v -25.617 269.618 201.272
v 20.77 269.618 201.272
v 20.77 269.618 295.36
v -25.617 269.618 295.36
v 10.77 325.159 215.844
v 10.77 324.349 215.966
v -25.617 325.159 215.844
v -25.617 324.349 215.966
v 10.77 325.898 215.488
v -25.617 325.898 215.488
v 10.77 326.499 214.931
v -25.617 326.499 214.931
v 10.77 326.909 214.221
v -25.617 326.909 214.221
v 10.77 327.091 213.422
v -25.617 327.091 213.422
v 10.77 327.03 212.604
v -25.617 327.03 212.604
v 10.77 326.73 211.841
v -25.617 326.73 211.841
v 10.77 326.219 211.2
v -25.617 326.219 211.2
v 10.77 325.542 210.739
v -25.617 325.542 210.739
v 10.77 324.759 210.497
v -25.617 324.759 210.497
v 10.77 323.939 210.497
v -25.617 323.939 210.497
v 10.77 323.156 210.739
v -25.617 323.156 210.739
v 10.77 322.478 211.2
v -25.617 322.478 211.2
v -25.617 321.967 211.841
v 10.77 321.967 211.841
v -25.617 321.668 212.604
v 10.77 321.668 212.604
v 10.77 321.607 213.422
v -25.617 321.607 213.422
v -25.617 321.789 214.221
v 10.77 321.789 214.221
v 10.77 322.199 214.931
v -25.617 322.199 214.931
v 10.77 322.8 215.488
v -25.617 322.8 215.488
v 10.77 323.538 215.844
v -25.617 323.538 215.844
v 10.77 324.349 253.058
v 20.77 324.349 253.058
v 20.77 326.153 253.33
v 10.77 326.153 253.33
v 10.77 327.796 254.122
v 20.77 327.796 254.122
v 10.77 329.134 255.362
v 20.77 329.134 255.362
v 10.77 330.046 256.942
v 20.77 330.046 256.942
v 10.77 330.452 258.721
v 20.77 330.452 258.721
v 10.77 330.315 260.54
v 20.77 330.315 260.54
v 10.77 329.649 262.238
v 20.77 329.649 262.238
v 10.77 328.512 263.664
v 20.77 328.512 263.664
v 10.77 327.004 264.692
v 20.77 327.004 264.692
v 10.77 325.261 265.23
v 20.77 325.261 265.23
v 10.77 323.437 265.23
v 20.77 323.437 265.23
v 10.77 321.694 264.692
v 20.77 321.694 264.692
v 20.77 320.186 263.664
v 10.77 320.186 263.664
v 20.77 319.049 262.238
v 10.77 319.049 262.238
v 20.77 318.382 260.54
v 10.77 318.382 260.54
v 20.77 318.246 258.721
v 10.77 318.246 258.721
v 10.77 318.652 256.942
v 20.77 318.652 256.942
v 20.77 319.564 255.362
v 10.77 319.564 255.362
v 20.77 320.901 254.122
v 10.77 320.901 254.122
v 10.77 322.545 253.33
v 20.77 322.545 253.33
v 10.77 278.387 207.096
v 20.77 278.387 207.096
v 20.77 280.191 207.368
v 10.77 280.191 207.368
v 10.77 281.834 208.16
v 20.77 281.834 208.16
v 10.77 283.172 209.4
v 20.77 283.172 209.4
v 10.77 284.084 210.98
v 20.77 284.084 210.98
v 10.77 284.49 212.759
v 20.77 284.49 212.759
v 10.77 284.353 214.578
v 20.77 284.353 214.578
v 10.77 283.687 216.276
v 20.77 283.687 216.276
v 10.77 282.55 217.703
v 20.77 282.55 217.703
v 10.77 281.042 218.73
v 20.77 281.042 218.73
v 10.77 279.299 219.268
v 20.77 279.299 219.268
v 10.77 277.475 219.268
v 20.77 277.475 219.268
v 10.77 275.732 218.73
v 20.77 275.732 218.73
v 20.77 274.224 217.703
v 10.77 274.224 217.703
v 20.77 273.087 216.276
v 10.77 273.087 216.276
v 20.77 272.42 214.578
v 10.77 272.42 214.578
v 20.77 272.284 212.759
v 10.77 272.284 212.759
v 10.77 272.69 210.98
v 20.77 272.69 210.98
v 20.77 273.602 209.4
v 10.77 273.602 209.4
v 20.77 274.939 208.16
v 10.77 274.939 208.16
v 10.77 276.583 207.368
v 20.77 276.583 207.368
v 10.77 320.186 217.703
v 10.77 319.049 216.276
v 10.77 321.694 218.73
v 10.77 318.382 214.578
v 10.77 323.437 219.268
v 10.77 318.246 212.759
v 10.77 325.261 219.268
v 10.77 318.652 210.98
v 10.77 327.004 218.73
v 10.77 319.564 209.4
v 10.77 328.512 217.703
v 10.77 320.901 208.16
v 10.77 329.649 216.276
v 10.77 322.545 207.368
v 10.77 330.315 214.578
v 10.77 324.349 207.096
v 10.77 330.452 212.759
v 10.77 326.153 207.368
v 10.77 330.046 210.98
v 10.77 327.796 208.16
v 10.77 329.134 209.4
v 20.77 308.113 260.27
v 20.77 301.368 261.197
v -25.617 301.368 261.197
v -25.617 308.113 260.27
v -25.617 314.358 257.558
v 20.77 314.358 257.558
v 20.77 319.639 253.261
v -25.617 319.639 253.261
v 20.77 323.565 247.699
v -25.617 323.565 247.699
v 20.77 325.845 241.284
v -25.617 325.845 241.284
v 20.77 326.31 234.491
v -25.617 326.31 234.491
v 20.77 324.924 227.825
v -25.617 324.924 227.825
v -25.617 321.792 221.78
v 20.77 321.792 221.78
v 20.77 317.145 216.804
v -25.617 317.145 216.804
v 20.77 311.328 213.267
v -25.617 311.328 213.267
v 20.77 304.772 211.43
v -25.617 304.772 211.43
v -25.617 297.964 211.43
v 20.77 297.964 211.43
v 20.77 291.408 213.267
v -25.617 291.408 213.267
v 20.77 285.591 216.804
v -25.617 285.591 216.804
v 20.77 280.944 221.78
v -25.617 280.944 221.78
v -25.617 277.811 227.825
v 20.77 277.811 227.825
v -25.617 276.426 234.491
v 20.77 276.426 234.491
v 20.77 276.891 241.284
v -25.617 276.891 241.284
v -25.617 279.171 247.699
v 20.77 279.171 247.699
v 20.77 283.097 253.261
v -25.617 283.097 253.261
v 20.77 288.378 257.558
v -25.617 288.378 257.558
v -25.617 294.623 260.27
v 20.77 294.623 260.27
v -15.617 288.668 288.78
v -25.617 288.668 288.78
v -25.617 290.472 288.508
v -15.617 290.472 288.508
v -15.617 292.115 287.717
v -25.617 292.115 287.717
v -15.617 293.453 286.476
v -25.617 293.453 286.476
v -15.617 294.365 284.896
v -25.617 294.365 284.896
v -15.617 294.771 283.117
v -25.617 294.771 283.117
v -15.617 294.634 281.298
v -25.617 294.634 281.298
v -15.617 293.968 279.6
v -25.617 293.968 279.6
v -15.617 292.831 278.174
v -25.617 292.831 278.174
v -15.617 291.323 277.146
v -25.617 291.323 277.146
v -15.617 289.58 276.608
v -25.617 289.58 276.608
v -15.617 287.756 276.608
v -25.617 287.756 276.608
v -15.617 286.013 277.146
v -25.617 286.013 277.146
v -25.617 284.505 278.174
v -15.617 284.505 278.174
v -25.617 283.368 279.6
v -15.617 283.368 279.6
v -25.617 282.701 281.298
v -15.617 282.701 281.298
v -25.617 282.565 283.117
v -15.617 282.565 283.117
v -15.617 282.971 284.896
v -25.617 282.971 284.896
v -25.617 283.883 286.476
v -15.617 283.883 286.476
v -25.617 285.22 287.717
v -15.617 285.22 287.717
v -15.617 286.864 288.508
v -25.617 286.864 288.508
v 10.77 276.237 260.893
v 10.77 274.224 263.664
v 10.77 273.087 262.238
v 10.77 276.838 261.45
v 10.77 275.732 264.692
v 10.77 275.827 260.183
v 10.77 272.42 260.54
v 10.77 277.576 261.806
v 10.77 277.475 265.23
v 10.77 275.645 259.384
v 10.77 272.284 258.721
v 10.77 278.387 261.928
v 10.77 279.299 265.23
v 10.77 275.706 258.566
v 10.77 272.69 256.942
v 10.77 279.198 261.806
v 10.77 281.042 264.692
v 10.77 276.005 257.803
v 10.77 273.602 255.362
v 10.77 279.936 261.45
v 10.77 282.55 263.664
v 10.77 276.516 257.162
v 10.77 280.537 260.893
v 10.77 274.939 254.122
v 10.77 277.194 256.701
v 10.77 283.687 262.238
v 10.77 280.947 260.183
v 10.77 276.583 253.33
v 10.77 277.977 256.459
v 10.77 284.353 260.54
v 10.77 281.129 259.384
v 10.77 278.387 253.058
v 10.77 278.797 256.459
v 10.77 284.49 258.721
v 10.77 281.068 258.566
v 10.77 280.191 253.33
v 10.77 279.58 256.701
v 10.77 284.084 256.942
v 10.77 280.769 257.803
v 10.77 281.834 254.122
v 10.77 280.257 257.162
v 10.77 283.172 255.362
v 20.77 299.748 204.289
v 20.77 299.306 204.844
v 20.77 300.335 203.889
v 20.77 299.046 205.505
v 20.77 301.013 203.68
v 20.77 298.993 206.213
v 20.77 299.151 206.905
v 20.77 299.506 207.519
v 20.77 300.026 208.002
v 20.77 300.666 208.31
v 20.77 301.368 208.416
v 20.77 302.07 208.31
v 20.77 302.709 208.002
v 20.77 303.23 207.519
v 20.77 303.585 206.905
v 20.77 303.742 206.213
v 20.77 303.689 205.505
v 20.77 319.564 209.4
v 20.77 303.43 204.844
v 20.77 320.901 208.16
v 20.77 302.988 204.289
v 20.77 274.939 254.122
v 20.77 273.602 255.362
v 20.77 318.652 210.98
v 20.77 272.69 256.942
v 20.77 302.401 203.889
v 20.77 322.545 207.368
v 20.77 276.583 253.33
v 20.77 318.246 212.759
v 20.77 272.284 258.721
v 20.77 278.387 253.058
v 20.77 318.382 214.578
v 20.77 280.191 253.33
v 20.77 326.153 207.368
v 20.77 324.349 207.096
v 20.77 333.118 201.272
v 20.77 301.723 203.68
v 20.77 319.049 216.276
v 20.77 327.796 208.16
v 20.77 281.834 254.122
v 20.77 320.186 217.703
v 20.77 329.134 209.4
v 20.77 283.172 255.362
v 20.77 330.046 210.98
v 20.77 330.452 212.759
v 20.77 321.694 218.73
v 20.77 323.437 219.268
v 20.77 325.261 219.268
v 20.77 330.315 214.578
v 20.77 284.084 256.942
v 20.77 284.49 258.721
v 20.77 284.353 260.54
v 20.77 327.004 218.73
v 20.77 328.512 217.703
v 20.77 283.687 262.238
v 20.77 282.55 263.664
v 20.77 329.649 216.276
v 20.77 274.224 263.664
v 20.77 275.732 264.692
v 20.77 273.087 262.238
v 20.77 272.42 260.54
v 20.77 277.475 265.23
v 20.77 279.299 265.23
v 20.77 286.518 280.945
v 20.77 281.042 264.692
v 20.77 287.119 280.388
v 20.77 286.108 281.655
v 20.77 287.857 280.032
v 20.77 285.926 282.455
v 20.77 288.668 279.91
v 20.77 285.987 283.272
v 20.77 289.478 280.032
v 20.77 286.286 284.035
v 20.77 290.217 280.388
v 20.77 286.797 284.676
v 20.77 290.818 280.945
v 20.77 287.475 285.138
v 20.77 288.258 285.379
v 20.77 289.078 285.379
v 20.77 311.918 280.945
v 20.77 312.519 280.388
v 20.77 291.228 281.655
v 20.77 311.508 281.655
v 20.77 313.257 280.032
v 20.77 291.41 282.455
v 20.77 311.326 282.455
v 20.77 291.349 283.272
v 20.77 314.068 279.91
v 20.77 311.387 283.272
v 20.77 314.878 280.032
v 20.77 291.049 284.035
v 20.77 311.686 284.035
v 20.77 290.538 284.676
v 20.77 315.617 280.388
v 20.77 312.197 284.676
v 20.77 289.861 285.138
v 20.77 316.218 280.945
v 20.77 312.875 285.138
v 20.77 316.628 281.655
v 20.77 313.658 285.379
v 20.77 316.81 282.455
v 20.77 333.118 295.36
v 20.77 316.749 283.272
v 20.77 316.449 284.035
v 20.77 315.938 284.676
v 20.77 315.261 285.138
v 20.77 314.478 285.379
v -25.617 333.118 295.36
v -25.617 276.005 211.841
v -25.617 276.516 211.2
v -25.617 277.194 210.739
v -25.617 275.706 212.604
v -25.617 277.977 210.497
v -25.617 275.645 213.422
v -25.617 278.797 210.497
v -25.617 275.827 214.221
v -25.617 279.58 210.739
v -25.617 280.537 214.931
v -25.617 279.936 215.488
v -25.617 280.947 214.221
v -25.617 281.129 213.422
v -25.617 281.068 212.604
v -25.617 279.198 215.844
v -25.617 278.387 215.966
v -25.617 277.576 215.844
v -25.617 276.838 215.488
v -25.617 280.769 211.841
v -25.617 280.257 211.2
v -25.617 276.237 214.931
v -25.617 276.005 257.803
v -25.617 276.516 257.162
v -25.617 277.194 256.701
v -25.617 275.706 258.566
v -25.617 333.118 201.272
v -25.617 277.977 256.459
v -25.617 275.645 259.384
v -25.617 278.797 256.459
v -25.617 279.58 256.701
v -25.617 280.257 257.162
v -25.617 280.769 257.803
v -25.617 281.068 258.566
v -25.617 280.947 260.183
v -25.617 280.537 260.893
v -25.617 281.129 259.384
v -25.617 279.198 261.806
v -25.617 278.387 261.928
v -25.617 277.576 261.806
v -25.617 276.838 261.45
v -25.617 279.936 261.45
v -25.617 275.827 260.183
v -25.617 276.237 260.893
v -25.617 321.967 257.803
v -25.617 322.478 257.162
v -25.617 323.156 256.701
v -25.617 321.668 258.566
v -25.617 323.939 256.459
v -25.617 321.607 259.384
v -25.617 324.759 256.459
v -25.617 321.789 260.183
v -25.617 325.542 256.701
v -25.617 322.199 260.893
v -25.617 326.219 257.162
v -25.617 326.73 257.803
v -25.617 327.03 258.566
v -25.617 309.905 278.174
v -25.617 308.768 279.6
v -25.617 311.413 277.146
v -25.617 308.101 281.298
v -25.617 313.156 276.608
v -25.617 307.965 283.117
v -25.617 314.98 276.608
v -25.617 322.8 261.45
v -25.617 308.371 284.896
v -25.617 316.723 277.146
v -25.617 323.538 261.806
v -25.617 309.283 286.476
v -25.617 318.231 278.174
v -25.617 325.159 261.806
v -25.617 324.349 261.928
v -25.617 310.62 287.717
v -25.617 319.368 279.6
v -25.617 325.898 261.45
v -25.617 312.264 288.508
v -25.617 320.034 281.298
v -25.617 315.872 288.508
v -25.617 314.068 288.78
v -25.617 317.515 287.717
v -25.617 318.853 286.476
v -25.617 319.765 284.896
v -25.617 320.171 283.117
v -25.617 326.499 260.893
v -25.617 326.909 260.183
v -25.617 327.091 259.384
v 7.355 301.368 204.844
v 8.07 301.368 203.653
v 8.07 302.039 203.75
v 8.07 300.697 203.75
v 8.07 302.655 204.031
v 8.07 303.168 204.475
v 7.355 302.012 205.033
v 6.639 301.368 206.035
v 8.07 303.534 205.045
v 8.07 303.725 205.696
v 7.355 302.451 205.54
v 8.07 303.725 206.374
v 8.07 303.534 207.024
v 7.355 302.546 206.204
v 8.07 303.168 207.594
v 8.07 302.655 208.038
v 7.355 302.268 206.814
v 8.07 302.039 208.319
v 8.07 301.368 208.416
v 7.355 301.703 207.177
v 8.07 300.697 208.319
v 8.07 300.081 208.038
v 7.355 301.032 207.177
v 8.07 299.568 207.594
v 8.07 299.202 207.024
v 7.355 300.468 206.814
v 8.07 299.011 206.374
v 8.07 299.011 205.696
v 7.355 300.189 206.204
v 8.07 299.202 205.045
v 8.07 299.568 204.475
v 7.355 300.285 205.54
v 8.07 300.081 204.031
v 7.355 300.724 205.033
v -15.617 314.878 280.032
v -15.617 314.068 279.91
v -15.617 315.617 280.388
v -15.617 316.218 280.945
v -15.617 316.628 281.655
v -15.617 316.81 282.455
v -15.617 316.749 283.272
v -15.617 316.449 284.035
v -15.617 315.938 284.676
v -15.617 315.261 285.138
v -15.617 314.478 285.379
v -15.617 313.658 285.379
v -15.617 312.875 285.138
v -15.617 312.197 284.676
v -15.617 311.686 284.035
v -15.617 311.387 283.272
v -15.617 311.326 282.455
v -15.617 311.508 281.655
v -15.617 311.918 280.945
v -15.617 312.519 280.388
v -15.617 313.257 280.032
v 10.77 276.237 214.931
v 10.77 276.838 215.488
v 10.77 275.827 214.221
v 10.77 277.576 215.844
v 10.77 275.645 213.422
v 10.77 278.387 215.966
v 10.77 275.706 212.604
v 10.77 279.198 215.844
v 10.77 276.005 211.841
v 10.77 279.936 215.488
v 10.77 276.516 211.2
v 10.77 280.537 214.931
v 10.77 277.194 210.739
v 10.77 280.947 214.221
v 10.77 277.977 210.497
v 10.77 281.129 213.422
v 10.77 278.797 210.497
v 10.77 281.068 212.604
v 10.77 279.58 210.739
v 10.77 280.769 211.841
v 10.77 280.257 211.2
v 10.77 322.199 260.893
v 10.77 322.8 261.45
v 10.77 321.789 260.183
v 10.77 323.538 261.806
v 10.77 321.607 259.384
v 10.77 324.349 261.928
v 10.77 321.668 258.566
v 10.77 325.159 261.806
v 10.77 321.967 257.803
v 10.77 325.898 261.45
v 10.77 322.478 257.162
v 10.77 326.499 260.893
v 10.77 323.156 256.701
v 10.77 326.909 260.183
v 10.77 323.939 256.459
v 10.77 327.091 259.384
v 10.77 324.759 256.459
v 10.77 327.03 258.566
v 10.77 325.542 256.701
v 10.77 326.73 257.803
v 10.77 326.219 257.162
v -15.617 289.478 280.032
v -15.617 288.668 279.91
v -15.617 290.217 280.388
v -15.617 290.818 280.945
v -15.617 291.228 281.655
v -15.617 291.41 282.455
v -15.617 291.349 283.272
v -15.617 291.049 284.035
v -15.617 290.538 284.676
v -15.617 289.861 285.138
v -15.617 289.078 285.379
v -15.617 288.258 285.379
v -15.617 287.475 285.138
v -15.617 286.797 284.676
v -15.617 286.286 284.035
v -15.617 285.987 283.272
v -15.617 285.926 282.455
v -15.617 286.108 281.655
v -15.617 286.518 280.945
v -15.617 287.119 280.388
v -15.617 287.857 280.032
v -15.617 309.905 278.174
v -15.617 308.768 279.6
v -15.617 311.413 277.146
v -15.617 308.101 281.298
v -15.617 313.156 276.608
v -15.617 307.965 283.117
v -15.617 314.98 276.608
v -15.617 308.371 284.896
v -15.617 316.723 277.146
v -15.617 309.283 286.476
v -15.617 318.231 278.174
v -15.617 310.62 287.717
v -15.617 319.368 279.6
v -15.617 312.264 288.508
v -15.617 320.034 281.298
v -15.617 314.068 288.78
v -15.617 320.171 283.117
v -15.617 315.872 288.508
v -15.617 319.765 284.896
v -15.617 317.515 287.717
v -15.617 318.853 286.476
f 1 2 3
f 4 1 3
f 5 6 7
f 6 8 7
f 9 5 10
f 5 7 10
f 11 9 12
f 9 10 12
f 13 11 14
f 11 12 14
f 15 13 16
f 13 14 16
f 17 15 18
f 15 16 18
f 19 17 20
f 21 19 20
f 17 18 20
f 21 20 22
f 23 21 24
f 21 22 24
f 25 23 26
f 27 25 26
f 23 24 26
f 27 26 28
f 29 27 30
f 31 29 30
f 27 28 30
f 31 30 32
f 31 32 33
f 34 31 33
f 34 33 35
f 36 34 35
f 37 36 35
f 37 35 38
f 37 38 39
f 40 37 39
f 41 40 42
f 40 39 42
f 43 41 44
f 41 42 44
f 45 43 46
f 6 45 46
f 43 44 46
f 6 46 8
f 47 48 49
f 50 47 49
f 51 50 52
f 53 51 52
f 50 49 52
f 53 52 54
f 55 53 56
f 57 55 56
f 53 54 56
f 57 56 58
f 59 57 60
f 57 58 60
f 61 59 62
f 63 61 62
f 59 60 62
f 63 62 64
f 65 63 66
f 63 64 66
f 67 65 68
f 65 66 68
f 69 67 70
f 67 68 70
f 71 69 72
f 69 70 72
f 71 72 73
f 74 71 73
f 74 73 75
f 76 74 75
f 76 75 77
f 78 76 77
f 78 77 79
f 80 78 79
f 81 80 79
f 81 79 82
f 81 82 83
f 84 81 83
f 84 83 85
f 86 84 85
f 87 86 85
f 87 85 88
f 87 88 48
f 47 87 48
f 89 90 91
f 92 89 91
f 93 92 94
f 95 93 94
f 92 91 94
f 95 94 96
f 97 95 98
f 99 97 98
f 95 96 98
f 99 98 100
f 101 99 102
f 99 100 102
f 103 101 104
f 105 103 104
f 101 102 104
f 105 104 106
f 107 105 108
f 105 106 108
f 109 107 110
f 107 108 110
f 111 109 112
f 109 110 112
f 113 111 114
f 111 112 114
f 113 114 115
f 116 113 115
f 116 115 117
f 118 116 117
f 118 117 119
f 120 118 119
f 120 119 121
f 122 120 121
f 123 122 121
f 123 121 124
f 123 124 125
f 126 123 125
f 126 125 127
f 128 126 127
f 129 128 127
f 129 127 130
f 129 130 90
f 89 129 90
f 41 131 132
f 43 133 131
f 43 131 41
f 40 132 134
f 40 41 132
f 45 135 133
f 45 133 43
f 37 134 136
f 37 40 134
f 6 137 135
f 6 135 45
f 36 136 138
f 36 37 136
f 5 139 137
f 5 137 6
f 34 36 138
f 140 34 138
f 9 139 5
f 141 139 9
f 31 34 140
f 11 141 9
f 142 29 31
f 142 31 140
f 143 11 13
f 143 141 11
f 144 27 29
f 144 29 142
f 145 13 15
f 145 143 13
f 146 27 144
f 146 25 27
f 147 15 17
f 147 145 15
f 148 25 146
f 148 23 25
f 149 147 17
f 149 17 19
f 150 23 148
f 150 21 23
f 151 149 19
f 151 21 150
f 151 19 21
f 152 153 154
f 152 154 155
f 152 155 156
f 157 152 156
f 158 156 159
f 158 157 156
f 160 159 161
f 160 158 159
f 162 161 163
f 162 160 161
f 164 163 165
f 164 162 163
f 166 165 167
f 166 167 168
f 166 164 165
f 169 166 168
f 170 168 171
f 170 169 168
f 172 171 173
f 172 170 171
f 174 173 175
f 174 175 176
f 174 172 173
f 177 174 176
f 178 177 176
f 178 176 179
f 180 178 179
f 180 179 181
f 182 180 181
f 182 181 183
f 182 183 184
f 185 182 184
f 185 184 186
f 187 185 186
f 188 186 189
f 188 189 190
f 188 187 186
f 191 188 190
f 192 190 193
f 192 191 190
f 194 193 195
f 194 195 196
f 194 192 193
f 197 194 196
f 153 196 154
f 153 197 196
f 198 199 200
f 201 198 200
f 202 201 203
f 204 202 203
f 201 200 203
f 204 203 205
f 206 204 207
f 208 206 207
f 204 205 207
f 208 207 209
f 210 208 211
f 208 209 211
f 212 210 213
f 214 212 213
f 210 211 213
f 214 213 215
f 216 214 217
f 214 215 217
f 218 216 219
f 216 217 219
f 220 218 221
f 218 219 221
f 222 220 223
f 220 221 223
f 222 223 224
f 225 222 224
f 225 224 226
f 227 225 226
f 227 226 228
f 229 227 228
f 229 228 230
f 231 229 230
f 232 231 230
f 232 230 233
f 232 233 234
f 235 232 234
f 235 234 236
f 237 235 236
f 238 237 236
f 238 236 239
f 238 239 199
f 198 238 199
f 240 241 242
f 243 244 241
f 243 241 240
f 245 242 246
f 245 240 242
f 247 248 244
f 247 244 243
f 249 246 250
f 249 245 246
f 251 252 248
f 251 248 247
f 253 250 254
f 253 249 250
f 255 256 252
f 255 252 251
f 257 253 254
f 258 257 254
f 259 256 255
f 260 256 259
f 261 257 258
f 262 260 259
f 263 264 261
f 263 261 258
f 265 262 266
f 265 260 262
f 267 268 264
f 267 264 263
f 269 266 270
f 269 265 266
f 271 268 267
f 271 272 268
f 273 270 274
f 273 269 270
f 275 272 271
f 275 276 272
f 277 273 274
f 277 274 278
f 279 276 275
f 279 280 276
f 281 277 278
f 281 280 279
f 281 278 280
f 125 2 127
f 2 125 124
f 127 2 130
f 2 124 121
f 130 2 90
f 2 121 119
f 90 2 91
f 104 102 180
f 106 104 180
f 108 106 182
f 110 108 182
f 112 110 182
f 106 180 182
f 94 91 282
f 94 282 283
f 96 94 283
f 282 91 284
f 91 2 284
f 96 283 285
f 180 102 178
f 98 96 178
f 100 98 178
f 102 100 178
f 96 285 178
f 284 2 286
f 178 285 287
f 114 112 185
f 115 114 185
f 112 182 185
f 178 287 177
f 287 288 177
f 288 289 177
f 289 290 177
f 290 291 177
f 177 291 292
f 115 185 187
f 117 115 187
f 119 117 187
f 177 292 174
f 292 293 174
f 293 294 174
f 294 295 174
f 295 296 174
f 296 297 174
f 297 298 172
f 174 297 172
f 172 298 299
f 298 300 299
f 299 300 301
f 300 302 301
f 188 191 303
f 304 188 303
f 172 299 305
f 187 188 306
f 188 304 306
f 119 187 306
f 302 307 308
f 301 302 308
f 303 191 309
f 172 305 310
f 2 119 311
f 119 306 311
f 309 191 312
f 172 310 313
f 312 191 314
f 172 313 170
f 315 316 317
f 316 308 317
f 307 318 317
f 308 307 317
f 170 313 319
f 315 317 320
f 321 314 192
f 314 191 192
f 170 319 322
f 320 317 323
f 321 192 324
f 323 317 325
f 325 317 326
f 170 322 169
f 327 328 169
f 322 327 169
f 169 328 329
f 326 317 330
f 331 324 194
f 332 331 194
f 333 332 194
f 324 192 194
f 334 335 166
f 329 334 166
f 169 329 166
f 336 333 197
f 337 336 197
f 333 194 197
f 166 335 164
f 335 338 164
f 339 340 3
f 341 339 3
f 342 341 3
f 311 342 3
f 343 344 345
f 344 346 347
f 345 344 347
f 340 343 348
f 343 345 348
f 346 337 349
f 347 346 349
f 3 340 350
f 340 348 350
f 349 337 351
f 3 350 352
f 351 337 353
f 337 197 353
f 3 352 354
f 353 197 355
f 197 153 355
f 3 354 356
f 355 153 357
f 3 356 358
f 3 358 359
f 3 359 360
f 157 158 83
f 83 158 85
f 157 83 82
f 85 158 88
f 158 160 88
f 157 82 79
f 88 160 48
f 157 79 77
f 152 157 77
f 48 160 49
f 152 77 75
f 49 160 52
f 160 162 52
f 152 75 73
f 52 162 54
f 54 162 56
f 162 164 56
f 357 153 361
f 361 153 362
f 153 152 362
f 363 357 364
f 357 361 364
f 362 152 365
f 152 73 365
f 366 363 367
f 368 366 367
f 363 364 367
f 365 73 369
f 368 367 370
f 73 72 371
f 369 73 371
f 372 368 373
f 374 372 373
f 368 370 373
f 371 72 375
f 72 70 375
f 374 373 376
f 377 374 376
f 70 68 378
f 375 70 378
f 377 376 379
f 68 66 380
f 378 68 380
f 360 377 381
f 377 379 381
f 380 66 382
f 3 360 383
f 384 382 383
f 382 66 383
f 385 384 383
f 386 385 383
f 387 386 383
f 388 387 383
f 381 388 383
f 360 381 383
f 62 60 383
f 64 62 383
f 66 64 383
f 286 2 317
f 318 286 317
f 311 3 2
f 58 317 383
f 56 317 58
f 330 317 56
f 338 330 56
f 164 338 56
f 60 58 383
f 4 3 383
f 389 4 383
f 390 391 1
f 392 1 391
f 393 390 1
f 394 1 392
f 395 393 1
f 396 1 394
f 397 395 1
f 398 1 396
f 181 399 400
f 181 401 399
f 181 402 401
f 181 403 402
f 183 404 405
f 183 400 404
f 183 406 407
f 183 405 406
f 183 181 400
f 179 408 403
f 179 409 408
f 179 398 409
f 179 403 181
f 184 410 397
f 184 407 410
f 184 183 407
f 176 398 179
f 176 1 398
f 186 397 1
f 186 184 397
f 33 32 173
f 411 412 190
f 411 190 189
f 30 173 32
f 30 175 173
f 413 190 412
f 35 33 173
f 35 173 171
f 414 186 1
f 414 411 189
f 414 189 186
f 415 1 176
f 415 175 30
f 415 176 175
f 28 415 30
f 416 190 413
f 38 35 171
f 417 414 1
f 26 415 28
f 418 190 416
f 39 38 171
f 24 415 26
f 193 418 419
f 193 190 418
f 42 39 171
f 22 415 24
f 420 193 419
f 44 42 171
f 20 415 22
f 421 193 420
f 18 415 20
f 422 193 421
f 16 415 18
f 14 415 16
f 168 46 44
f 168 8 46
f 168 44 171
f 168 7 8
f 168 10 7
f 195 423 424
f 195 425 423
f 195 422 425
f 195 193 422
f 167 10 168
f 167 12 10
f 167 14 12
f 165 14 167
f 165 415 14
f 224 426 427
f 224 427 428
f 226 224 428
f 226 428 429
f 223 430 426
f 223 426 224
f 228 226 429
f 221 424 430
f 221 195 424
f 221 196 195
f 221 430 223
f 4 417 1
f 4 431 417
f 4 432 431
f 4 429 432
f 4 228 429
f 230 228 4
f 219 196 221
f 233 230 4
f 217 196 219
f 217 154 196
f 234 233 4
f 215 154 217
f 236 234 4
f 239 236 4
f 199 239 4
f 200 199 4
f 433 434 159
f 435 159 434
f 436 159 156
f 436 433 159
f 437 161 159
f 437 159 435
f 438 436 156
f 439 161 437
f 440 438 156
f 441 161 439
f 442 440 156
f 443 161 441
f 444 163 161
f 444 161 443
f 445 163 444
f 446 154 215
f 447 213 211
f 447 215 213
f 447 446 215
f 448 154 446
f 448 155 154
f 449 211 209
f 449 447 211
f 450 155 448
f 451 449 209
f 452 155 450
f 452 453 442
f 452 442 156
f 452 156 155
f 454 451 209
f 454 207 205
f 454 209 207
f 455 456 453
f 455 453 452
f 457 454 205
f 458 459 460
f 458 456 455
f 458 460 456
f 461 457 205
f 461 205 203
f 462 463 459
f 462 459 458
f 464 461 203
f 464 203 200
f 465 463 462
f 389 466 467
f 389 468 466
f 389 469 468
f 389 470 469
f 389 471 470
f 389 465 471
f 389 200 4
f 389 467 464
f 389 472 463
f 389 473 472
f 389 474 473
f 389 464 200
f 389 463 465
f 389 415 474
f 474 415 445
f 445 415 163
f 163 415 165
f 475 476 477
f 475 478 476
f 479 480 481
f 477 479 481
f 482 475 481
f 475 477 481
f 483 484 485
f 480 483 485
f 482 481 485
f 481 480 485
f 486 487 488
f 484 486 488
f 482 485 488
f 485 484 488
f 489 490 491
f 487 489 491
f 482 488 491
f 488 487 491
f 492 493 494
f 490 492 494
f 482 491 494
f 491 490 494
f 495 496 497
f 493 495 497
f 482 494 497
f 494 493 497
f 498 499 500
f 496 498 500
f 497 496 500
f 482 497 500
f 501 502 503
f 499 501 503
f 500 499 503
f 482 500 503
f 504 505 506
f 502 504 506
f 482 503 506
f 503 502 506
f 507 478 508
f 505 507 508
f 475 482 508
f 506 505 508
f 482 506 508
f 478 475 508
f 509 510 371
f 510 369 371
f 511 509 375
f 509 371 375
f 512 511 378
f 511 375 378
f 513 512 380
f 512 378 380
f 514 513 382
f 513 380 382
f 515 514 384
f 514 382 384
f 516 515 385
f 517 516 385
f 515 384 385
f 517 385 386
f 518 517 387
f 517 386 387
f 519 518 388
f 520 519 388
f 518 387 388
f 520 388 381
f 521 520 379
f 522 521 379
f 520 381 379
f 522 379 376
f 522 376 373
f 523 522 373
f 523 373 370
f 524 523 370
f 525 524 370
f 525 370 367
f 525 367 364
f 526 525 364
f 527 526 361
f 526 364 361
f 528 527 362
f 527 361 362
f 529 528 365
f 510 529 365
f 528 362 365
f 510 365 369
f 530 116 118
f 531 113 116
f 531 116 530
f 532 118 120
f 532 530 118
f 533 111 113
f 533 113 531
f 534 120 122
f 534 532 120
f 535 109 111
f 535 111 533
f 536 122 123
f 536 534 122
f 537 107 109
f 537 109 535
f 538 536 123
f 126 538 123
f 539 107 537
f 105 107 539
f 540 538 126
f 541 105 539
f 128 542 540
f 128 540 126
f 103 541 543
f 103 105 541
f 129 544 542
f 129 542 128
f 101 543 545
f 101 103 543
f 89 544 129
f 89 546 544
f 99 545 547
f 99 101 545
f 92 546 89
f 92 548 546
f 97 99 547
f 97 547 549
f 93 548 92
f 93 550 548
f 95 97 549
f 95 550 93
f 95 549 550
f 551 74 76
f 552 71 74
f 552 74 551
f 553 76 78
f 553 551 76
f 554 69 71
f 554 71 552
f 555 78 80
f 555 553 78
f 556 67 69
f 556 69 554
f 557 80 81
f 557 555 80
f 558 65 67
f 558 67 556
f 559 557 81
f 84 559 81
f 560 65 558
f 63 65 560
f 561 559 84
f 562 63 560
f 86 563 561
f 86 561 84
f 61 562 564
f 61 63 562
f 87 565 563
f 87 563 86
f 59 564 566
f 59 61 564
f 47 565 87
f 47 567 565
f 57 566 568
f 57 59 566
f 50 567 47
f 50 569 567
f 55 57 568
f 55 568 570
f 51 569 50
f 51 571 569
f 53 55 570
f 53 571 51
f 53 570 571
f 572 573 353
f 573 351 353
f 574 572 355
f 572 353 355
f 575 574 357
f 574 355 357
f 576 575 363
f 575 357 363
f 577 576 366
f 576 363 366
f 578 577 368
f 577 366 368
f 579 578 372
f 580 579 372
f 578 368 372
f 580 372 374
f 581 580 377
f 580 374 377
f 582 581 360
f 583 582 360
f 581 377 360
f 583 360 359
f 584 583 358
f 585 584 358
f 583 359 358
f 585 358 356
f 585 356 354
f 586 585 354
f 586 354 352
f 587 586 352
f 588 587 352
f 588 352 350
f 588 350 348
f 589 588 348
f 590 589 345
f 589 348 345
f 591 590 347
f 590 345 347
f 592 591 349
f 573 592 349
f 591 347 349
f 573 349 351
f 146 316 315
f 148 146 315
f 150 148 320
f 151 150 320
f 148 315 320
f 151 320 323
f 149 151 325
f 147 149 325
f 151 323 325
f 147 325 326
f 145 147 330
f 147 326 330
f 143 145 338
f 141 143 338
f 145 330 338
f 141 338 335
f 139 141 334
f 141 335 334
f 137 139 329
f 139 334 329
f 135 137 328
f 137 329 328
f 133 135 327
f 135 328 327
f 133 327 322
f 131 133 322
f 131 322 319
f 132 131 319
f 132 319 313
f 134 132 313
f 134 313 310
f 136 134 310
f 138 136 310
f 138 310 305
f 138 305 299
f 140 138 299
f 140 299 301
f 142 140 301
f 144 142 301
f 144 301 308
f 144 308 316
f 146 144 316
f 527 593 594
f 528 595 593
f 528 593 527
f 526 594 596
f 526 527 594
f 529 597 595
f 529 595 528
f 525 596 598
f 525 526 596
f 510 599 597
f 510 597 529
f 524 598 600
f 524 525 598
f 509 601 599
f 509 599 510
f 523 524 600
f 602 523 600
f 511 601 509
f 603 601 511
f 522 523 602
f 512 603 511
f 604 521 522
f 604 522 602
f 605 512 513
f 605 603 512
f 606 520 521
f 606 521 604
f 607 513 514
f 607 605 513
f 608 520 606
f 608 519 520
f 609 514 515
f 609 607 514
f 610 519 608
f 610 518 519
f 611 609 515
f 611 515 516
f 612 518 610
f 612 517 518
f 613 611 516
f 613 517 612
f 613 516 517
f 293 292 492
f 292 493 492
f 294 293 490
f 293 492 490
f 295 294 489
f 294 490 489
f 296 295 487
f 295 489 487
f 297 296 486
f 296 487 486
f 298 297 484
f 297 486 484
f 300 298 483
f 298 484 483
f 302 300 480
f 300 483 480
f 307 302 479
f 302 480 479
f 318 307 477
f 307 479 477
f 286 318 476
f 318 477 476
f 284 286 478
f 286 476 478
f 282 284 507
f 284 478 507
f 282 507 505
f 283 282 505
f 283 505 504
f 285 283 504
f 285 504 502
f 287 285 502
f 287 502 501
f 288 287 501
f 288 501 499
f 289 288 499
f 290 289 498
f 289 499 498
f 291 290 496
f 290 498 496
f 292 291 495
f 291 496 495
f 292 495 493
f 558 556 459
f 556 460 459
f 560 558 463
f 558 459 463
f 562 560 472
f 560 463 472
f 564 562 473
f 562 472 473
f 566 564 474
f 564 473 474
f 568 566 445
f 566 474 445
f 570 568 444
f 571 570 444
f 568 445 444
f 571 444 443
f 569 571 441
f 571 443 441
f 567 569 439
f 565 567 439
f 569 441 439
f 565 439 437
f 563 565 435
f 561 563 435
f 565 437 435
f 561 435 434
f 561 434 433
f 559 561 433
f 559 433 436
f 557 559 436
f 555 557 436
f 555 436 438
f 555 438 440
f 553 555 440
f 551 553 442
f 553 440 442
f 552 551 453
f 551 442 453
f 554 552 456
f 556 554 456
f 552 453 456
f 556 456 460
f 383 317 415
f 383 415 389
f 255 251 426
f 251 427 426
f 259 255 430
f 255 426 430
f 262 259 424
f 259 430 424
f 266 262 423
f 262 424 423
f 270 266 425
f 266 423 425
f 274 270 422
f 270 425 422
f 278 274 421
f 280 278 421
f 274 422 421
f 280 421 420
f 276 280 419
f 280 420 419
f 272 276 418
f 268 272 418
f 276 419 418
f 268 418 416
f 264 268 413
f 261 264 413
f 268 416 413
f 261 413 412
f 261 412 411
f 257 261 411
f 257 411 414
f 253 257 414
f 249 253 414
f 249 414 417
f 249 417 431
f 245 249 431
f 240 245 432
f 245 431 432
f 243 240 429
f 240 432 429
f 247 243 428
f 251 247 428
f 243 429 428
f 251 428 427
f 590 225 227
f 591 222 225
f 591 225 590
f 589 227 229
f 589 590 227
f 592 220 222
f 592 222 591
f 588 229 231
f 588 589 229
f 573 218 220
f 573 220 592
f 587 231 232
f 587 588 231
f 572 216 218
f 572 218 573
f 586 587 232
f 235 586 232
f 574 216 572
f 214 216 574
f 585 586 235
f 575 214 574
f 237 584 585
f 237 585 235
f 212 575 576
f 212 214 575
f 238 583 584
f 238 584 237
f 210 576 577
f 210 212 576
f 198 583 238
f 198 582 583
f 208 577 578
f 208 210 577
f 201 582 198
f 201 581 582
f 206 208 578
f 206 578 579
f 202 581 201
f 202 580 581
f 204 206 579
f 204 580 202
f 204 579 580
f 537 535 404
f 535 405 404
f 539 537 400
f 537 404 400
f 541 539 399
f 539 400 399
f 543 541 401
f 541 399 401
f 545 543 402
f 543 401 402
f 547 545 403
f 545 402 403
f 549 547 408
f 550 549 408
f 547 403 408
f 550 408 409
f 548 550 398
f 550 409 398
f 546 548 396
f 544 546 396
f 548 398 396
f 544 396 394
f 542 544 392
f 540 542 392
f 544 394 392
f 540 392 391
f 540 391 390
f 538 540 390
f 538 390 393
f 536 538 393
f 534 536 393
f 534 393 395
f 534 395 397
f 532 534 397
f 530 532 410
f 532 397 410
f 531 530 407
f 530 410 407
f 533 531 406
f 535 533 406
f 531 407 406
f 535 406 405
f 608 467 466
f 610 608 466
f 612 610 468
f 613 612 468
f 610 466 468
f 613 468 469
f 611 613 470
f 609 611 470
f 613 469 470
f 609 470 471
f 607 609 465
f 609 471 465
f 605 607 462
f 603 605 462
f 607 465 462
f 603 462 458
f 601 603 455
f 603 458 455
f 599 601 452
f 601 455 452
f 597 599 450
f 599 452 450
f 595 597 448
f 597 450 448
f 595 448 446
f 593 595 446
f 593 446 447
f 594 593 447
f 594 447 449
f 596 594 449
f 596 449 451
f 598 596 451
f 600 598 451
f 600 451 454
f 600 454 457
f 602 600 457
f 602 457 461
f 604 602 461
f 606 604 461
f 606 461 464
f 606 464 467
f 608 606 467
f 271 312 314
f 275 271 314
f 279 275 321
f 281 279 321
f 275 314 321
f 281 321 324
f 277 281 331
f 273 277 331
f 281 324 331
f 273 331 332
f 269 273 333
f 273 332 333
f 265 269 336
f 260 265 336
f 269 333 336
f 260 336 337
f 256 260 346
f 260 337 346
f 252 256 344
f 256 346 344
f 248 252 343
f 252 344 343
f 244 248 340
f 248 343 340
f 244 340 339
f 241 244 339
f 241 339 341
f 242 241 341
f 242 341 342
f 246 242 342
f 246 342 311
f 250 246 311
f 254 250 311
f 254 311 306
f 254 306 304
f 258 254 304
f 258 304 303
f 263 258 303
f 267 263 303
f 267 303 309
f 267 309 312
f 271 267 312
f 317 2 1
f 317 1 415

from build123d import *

# Parameters (mm, degrees)
SKETCH1_W                               = 94.087856827
SKETCH1_H                               = 63.5
SKETCH1_R                               = 25
BOSS_EXTRUDE1_DEPTH                     = 46.387125
CBORE_FOR_M5_HEX_HEAD_BOLT1_D           = 5.5
CBORE_FOR_M5_HEX_HEAD_BOLT1_CBORE_D     = 12.24
CBORE_FOR_M5_HEX_HEAD_BOLT1_CBORE_DEPTH = 10
CBORE_FOR_M5_HEX_HEAD_BOLT2_D           = 5.5
CBORE_FOR_M5_HEX_HEAD_BOLT2_CBORE_D     = 12.24
CBORE_FOR_M5_HEX_HEAD_BOLT2_CBORE_DEPTH = 10
HOLE_FOR_6_300_SC_NUTS_SP_1_D           = 4.7625
HOLE_FOR_6_300_SC_NUTS_SP_1_DEPTH       = 12.7
HOLE_FOR_6_300_SC_NUTS_SP_1_TIP         = 1.430799349


with BuildPart() as part:
    # Sketch1 → Boss-Extrude1 (new body)
    with BuildSketch(Plane.ZY.offset(-20.770136657)):
        with Locations((248.31612335, 301.367904211)):
            Rectangle(SKETCH1_W, SKETCH1_H)
        with Locations((236.197194936, 301.367904211)):
            Circle(SKETCH1_R, mode=Mode.SUBTRACT)
    extrude(amount=BOSS_EXTRUDE1_DEPTH)

    # CBORE for M5 Hex Head Bolt1 (through all)
    with Locations(Plane(origin=(20.770136657, 0, 0), x_dir=(0, 0, -1), z_dir=(1, 0, 0))):
        with Locations((-259.178165324, 324.348874599), (-259.178165324, 278.386933822), (-213.216224547, 278.386933822), (-213.216224547, 324.348874599)):
            CounterBoreHole(CBORE_FOR_M5_HEX_HEAD_BOLT1_D / 2, CBORE_FOR_M5_HEX_HEAD_BOLT1_CBORE_D / 2, CBORE_FOR_M5_HEX_HEAD_BOLT1_CBORE_DEPTH)

    # CBORE for M5 Hex Head Bolt2 (through all)
    with Locations(Plane.ZY.offset(25.616988343)):
        with Locations((282.660051763, 314.067904211), (282.660051763, 288.667904211)):
            CounterBoreHole(CBORE_FOR_M5_HEX_HEAD_BOLT2_D / 2, CBORE_FOR_M5_HEX_HEAD_BOLT2_CBORE_D / 2, CBORE_FOR_M5_HEX_HEAD_BOLT2_CBORE_DEPTH)

    # Hole for #6 300® SC Nuts (SP)1
    with Locations(Plane(origin=(20.770136657, 0, 0), x_dir=(0, 0, -1), z_dir=(1, 0, 0))):
        with Locations((-206.034694936, 301.367904211)):
            Hole(HOLE_FOR_6_300_SC_NUTS_SP_1_D / 2, depth=HOLE_FOR_6_300_SC_NUTS_SP_1_DEPTH)
            with Locations((0, 0, -(HOLE_FOR_6_300_SC_NUTS_SP_1_DEPTH + HOLE_FOR_6_300_SC_NUTS_SP_1_TIP / 2))):  # 118° drill point
                Cone(0, HOLE_FOR_6_300_SC_NUTS_SP_1_D / 2, HOLE_FOR_6_300_SC_NUTS_SP_1_TIP, mode=Mode.SUBTRACT)


solid = part.part
